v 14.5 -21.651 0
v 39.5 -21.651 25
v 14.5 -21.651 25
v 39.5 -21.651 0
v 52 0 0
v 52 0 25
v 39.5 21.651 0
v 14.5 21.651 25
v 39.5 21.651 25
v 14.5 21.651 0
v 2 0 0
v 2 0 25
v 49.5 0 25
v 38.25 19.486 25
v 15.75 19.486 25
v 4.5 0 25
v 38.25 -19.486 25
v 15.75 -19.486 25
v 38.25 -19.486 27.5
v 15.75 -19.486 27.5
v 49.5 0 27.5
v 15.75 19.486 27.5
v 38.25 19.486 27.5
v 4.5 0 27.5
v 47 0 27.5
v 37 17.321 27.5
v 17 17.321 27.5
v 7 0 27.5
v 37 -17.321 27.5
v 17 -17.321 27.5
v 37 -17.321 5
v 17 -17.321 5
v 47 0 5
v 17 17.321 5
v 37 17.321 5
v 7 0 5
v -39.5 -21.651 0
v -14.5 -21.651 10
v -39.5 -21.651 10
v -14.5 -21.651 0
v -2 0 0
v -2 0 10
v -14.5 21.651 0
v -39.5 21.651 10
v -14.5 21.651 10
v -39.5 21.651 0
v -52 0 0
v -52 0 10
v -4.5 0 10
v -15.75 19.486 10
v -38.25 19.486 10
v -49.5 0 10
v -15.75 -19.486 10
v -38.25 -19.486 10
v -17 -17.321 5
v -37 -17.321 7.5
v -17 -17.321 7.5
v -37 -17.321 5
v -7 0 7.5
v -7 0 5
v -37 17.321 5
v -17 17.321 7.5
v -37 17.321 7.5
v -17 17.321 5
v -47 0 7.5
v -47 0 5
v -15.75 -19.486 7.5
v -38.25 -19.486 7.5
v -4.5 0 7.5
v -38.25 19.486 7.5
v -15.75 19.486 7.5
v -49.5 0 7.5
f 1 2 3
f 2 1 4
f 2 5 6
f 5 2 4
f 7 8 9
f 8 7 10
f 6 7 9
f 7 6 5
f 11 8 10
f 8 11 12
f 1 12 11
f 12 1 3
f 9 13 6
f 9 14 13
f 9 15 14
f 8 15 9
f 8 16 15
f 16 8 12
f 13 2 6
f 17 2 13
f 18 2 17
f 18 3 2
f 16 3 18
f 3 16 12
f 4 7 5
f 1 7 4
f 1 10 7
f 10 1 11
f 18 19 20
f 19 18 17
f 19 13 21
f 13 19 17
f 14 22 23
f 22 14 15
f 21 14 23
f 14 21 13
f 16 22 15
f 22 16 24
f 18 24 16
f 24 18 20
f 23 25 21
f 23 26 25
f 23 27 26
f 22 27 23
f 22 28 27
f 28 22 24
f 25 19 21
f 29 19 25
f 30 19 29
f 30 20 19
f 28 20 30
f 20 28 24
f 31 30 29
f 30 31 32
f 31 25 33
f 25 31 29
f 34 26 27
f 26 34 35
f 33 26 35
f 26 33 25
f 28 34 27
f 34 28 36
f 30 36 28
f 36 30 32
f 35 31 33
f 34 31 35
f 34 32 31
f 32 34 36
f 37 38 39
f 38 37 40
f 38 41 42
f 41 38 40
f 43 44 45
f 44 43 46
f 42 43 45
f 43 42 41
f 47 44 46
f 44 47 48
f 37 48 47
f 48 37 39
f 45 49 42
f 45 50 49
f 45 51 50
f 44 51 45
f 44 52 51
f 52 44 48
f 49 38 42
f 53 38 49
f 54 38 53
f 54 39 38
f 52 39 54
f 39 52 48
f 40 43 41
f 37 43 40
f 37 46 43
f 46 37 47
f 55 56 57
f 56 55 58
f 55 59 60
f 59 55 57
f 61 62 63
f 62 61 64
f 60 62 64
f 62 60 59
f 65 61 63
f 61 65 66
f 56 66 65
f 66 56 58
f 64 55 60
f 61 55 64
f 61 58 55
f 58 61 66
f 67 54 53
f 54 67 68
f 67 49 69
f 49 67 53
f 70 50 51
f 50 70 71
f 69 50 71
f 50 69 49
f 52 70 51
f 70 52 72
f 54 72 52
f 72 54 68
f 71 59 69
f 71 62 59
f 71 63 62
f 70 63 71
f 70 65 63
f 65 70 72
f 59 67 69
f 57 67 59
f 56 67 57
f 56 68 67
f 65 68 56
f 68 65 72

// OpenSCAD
// A polygonal box and lid.

// number of sides the box has
box_sides = 6; // [3:60]

// outer radius of the box
box_rad = 25; // [10:75]

// height of the base
base_height = 25; // [5:150]

// height of the lid
lid_height = 10; // [5:150]

// thickness of the walls, top, and bottom
wall_thickness = 5; // [1:25]

// thickness of the rim
rim_thickness = 2.5; // [0.0:0.5:10]

// height of the rim
rim_height = 2.5; // [0.0:0.5:10]

// vertical allowance for the rim
v_slop = 0; // [-1:0.1:1]

// horizontal allowance for the rim
h_slop = 0; // [-1:0.1:1]

translate([box_rad + 2, 0, 0]) difference() { // the box
    union() { // join the outer box form and the lip together so we can just subtract the center once
        cylinder(r = box_rad, h = base_height, $fn = box_sides); // outside of box
        cylinder(r = box_rad - wall_thickness + rim_thickness + h_slop, h = base_height + rim_height - v_slop, $fn = box_sides); // outside of lip
    }
    translate([0, 0, wall_thickness]) cylinder(r = box_rad - wall_thickness, h = base_height + rim_height, $fn = box_sides);
}

translate([-1 * box_rad - 2, 0, 0]) difference() { // the lid
    cylinder(r = box_rad, h = lid_height, $fn = box_sides); // outside of the lid
    // subtract the box void
    translate([0, 0, wall_thickness]) cylinder(r = box_rad - wall_thickness, h = lid_height, $fn = box_sides);
    // subtract where the rim goes
    translate([0, 0, lid_height - rim_height - v_slop]) cylinder(r = box_rad - wall_thickness + rim_thickness - h_slop, h = lid_height + v_slop, $fn = box_sides);
}
